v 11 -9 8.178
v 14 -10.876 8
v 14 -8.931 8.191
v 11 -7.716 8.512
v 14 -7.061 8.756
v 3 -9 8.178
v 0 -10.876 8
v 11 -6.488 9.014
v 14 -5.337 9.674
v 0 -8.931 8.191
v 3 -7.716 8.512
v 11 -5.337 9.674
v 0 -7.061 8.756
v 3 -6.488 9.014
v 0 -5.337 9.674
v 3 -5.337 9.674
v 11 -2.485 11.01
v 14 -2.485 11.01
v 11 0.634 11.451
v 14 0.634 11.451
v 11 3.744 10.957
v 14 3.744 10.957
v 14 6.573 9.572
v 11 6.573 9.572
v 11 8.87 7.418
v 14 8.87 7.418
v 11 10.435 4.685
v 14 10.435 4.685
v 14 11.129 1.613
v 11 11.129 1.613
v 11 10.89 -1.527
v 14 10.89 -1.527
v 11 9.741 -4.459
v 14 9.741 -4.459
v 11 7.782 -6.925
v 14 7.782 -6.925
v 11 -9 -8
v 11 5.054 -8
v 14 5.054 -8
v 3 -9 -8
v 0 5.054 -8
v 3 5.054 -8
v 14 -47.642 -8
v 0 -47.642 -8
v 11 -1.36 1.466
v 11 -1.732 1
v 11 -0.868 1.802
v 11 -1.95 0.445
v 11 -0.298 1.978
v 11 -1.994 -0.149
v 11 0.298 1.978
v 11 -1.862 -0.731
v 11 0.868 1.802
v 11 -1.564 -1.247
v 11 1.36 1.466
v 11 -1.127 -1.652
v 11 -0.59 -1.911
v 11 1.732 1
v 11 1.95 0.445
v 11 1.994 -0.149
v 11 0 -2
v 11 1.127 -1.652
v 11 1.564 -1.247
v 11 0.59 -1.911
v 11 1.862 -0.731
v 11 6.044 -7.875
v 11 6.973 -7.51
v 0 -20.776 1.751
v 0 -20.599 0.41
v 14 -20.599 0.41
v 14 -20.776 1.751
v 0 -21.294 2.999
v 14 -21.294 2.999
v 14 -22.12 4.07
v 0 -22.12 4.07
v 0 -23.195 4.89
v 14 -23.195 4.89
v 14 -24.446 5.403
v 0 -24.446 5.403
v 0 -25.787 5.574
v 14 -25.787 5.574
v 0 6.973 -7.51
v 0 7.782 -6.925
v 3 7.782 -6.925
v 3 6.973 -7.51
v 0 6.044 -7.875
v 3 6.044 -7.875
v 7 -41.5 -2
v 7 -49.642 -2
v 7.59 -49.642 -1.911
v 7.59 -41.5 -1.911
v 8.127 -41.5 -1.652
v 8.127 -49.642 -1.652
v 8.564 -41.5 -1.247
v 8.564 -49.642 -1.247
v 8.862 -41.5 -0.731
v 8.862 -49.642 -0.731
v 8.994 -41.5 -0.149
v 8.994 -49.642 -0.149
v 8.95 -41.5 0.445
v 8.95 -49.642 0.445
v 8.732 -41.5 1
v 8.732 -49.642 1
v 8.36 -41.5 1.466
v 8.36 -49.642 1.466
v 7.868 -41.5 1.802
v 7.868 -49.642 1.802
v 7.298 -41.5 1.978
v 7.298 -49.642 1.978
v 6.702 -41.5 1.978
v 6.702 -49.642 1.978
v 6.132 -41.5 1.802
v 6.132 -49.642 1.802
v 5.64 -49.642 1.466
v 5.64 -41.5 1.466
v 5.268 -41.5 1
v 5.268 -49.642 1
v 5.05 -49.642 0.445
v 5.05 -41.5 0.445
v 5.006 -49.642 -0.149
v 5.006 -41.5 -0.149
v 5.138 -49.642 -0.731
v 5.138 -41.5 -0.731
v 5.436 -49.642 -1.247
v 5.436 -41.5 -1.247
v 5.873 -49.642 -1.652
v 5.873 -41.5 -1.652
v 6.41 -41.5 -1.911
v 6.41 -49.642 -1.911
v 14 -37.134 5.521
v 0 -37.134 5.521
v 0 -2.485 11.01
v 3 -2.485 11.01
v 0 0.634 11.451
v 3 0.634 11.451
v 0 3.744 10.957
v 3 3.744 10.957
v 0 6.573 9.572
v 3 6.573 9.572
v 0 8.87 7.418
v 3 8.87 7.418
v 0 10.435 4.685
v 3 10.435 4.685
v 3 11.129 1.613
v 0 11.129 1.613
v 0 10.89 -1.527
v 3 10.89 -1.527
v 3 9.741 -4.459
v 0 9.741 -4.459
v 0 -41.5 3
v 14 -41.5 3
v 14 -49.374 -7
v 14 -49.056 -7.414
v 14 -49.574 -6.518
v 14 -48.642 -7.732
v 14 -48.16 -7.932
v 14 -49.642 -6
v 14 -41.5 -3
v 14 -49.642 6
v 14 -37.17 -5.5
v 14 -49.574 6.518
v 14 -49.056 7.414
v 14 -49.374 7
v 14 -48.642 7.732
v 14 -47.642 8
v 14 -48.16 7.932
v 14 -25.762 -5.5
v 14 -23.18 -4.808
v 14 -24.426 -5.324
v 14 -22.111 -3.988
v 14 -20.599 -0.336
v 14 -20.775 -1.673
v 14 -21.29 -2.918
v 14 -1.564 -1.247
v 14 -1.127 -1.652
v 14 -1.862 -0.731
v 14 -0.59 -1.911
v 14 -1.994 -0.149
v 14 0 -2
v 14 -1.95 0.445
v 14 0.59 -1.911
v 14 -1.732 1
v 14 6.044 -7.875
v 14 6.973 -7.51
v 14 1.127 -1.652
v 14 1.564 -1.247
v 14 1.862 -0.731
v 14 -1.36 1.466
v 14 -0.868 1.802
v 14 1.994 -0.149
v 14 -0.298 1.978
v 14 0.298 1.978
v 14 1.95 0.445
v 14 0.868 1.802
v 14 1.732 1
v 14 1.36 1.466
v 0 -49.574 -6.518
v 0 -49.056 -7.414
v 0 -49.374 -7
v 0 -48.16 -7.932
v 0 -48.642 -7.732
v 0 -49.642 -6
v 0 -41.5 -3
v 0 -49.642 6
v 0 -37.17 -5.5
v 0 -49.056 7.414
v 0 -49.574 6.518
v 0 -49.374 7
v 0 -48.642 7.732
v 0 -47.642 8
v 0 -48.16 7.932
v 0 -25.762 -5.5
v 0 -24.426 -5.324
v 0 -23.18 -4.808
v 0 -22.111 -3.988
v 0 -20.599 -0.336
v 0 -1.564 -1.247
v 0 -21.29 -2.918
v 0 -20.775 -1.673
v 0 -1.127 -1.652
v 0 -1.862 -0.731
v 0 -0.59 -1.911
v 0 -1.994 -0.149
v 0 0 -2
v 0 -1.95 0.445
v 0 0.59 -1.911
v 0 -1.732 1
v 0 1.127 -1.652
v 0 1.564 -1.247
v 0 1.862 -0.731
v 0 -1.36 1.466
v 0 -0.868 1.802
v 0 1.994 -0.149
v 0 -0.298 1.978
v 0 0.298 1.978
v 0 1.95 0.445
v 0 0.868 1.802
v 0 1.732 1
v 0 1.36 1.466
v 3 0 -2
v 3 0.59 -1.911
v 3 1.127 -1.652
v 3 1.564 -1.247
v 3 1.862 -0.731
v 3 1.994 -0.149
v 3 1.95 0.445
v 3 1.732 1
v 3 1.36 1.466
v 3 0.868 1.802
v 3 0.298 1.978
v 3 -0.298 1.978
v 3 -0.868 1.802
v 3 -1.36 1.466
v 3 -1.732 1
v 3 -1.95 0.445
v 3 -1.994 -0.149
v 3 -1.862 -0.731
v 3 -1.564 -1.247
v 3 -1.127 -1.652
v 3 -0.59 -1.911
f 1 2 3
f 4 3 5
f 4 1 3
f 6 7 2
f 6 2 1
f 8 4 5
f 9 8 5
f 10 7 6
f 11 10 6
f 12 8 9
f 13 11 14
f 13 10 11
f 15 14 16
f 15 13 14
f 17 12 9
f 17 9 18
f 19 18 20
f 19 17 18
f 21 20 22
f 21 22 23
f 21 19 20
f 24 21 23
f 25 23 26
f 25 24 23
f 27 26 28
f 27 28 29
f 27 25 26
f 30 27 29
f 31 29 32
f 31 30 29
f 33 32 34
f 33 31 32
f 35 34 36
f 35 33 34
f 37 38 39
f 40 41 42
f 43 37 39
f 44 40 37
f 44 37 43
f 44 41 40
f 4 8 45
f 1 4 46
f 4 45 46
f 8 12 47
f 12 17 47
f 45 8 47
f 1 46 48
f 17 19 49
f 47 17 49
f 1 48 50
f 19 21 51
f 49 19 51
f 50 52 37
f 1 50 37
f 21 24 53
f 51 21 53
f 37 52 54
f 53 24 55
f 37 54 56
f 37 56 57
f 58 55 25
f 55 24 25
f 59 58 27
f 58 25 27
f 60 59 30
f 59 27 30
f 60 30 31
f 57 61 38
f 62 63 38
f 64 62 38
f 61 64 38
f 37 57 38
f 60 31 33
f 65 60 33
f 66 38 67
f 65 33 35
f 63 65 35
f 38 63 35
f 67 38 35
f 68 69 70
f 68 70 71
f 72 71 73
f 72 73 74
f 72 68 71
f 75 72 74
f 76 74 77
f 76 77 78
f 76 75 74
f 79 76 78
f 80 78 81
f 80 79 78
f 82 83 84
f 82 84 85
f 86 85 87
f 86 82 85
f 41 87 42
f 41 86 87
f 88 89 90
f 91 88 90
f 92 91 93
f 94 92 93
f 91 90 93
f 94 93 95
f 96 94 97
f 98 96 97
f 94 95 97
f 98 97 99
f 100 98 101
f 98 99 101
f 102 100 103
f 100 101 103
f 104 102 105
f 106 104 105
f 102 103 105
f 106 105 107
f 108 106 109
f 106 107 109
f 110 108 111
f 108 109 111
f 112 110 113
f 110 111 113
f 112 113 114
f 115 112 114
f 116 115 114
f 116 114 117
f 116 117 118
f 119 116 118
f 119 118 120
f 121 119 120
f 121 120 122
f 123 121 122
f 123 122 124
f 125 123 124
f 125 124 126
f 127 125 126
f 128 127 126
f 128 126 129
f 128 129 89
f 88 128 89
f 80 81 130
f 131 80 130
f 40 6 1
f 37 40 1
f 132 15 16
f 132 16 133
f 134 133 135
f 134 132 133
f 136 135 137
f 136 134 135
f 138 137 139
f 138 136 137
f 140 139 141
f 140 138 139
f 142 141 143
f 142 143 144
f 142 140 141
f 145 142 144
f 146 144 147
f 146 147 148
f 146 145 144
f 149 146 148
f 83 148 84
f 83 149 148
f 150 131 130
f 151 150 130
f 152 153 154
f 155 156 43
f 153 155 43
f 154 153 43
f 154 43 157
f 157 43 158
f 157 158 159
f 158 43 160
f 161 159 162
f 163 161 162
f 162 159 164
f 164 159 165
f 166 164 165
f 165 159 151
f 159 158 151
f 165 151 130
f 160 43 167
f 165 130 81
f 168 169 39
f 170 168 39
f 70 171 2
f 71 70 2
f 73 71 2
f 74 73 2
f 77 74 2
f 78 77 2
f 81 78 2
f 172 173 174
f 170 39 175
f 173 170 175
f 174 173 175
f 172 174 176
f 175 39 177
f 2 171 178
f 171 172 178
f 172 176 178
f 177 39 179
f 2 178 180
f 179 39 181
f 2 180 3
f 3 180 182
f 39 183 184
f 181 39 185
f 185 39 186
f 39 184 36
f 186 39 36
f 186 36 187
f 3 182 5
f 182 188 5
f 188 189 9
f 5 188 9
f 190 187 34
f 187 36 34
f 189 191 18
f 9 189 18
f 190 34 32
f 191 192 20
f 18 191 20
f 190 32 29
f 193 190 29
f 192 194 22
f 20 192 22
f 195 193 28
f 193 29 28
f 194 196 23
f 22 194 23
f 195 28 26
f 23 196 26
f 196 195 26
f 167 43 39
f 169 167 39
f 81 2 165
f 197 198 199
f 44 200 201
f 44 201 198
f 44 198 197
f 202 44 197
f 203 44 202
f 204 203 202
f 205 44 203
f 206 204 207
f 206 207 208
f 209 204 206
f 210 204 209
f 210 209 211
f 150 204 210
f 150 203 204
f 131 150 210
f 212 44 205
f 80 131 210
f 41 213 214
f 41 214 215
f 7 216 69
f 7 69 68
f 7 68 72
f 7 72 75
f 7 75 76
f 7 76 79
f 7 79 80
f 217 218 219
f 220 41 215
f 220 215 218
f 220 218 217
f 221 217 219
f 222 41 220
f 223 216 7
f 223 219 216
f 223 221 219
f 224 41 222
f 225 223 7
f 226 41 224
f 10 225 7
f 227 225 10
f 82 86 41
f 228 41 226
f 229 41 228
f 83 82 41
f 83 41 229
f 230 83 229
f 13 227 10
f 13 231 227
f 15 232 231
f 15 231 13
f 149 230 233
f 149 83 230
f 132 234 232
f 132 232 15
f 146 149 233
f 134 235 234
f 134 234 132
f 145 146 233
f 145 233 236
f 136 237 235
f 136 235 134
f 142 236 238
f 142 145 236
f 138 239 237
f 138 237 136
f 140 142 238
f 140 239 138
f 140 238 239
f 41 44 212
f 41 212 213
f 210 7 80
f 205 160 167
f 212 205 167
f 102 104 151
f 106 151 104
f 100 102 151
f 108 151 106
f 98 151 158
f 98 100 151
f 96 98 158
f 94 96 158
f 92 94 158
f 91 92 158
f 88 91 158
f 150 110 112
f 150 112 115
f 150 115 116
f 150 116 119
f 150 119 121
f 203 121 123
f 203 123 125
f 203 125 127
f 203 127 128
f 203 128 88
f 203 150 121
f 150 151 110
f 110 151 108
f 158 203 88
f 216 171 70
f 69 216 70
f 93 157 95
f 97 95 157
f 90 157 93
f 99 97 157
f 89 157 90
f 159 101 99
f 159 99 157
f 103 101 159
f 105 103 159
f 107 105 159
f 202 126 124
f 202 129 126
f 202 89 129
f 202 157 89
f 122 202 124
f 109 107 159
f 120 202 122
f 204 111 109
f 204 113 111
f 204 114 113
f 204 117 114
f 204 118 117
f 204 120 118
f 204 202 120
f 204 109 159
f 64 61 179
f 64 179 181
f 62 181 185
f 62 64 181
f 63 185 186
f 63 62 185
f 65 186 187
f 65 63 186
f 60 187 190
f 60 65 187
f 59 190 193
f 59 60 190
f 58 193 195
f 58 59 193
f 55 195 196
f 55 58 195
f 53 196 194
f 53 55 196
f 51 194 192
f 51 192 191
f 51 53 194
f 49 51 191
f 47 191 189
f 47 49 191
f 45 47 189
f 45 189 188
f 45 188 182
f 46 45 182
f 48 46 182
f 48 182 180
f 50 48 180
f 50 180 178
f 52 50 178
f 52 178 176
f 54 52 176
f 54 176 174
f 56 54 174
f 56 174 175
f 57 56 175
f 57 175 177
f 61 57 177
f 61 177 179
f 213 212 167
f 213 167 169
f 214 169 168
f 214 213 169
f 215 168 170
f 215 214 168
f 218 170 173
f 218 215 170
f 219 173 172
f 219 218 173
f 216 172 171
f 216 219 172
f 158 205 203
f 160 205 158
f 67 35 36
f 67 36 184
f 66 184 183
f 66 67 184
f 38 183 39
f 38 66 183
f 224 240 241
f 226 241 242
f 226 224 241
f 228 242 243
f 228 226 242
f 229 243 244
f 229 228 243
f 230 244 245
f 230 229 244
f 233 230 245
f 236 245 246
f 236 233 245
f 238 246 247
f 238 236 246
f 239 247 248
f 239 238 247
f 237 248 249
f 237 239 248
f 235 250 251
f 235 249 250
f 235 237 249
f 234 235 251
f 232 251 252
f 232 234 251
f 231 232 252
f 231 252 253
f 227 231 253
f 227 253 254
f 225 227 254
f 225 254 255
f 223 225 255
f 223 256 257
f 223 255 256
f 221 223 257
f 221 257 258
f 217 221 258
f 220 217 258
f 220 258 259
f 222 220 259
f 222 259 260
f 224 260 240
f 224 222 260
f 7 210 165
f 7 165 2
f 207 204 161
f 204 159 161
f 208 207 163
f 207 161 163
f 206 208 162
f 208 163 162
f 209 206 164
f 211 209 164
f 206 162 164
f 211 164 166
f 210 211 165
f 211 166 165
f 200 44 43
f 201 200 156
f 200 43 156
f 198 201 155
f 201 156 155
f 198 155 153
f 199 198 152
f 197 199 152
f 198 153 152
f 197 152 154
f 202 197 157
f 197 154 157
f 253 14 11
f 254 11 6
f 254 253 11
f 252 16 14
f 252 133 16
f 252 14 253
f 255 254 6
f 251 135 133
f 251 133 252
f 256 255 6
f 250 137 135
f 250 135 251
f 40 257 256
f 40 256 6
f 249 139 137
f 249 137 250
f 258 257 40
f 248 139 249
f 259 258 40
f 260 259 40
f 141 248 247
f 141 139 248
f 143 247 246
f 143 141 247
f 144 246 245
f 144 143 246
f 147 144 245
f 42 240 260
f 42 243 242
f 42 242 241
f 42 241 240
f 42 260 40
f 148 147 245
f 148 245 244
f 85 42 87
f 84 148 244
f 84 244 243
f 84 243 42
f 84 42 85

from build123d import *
from OCP.BRepFilletAPI import BRepFilletAPI_MakeChamfer

# Parameters (mm, degrees)
SKETCH9_R           = 2
BOSS_EXTRUDE3_DEPTH = 14
SKETCH10_R          = 2
CUT_EXTRUDE7_DEPTH  = 14
SKETCH11_W          = 8
SKETCH11_H          = 26.663957413
CUT_EXTRUDE8_DEPTH  = 25
FILLET1_R           = 2
CHAMFER1_SIZE       = 2.5
CHAMFER1_SIZE2      = 4.365846821
CHAMFER1_SIZE2_2    = 4.330127019


with BuildPart() as part:
    # Sketch9 → Boss-Extrude3 (new body)
    with BuildSketch(Plane(origin=(0, 0, 0), x_dir=(0, 0, -1), z_dir=(1, 0, 0))):
        with BuildLine():
            Line((8, 5.053889445), (8, -49.642014822))
            Line((8, -49.642014822), (-8, -49.642014822))
            Line((-8, -49.642014822), (-8, -10.875806049))
            ThreePointArc((-8, -10.875806049), (-8.427714838, -7.982476346), (-9.674271354, -5.336650652))
            ThreePointArc((-9.674271354, -5.336650652), (-7.418447874, 8.870328147), (6.925281884, 7.78202542))
            ThreePointArc((6.925281884, 7.78202542), (7.721634556, 6.519985019), (8, 5.053889445))
        make_face()
        Circle(SKETCH9_R, mode=Mode.SUBTRACT)
        with BuildLine():
            Line((5.5, -41.5), (5.5, -25.762364524))
            ThreePointArc((5.5, -25.762364524), (3.987567872, -22.111030369), (0.336233717, -20.598598241))
            Line((0.336233717, -20.598598241), (-0.410415455, -20.598598241))
            ThreePointArc((-0.410415455, -20.598598241), (-4.070351606, -22.119652678), (-5.574124284, -25.786723302))
            Line((-5.574124284, -25.786723302), (-5.5, -41.5))
            Line((-5.5, -41.5), (5.5, -41.5))
        make_face(mode=Mode.SUBTRACT)
    extrude(amount=BOSS_EXTRUDE3_DEPTH)

    # Sketch10 → Cut-Extrude7 (cut)
    with BuildSketch(Plane.XZ.offset(49.642014822)):
        with Locations(Location((7, 0, 0), (0, 0, 270))):
            Circle(SKETCH10_R)
    extrude(amount=-CUT_EXTRUDE7_DEPTH, mode=Mode.SUBTRACT)

    # Sketch11 → Cut-Extrude8 (cut)
    with BuildSketch(Plane(origin=(0, 16, 0), x_dir=(1, 0, 0), z_dir=(0, 1, 0))):
        with Locations((7, -2.726740944)):
            Rectangle(SKETCH11_W, SKETCH11_H)
    extrude(amount=-CUT_EXTRUDE8_DEPTH, mode=Mode.SUBTRACT)

    # Fillet1
    fillet1_edges = [part.edges().sort_by_distance(p)[0] for p in [
        (7, -49.642014822, 8),
        (7, -49.642014822, -8),
    ]]
    fillet(fillet1_edges, radius=FILLET1_R)

    # Chamfer1: one chamfer whose edges measure the first distance from different faces: ONE call of the kernel's chamfer builder (chamfer() names one face for all edges)
    chamfer1_edges_1 = [part.edges().sort_by_distance(p)[0] for p in [
        (7, -41.5, 5.5),
    ]]
    chamfer1_side_1 = [part.faces().sort_by_distance(p)[0] for p in [
        (7, -41.5, 5.321955062),
    ]]
    chamfer1_edges_2 = [part.edges().sort_by_distance(p)[0] for p in [
        (7, -41.5, -5.5),
    ]]
    chamfer1_side_2 = [part.faces().sort_by_distance(p)[0] for p in [
        (7, -41.5, 5.321955062),
    ]]
    chamfer1 = BRepFilletAPI_MakeChamfer(part.part.solid().wrapped)
    for e in chamfer1_edges_1:
        chamfer1.Add(CHAMFER1_SIZE, CHAMFER1_SIZE2, e.wrapped, chamfer1_side_1[0].wrapped)  # the first distance lies on this face
    for e in chamfer1_edges_2:
        chamfer1.Add(CHAMFER1_SIZE, CHAMFER1_SIZE2_2, e.wrapped, chamfer1_side_2[0].wrapped)  # the first distance lies on this face
    add(Compound.cast(chamfer1.Shape()), mode=Mode.REPLACE)


solid = part.part
